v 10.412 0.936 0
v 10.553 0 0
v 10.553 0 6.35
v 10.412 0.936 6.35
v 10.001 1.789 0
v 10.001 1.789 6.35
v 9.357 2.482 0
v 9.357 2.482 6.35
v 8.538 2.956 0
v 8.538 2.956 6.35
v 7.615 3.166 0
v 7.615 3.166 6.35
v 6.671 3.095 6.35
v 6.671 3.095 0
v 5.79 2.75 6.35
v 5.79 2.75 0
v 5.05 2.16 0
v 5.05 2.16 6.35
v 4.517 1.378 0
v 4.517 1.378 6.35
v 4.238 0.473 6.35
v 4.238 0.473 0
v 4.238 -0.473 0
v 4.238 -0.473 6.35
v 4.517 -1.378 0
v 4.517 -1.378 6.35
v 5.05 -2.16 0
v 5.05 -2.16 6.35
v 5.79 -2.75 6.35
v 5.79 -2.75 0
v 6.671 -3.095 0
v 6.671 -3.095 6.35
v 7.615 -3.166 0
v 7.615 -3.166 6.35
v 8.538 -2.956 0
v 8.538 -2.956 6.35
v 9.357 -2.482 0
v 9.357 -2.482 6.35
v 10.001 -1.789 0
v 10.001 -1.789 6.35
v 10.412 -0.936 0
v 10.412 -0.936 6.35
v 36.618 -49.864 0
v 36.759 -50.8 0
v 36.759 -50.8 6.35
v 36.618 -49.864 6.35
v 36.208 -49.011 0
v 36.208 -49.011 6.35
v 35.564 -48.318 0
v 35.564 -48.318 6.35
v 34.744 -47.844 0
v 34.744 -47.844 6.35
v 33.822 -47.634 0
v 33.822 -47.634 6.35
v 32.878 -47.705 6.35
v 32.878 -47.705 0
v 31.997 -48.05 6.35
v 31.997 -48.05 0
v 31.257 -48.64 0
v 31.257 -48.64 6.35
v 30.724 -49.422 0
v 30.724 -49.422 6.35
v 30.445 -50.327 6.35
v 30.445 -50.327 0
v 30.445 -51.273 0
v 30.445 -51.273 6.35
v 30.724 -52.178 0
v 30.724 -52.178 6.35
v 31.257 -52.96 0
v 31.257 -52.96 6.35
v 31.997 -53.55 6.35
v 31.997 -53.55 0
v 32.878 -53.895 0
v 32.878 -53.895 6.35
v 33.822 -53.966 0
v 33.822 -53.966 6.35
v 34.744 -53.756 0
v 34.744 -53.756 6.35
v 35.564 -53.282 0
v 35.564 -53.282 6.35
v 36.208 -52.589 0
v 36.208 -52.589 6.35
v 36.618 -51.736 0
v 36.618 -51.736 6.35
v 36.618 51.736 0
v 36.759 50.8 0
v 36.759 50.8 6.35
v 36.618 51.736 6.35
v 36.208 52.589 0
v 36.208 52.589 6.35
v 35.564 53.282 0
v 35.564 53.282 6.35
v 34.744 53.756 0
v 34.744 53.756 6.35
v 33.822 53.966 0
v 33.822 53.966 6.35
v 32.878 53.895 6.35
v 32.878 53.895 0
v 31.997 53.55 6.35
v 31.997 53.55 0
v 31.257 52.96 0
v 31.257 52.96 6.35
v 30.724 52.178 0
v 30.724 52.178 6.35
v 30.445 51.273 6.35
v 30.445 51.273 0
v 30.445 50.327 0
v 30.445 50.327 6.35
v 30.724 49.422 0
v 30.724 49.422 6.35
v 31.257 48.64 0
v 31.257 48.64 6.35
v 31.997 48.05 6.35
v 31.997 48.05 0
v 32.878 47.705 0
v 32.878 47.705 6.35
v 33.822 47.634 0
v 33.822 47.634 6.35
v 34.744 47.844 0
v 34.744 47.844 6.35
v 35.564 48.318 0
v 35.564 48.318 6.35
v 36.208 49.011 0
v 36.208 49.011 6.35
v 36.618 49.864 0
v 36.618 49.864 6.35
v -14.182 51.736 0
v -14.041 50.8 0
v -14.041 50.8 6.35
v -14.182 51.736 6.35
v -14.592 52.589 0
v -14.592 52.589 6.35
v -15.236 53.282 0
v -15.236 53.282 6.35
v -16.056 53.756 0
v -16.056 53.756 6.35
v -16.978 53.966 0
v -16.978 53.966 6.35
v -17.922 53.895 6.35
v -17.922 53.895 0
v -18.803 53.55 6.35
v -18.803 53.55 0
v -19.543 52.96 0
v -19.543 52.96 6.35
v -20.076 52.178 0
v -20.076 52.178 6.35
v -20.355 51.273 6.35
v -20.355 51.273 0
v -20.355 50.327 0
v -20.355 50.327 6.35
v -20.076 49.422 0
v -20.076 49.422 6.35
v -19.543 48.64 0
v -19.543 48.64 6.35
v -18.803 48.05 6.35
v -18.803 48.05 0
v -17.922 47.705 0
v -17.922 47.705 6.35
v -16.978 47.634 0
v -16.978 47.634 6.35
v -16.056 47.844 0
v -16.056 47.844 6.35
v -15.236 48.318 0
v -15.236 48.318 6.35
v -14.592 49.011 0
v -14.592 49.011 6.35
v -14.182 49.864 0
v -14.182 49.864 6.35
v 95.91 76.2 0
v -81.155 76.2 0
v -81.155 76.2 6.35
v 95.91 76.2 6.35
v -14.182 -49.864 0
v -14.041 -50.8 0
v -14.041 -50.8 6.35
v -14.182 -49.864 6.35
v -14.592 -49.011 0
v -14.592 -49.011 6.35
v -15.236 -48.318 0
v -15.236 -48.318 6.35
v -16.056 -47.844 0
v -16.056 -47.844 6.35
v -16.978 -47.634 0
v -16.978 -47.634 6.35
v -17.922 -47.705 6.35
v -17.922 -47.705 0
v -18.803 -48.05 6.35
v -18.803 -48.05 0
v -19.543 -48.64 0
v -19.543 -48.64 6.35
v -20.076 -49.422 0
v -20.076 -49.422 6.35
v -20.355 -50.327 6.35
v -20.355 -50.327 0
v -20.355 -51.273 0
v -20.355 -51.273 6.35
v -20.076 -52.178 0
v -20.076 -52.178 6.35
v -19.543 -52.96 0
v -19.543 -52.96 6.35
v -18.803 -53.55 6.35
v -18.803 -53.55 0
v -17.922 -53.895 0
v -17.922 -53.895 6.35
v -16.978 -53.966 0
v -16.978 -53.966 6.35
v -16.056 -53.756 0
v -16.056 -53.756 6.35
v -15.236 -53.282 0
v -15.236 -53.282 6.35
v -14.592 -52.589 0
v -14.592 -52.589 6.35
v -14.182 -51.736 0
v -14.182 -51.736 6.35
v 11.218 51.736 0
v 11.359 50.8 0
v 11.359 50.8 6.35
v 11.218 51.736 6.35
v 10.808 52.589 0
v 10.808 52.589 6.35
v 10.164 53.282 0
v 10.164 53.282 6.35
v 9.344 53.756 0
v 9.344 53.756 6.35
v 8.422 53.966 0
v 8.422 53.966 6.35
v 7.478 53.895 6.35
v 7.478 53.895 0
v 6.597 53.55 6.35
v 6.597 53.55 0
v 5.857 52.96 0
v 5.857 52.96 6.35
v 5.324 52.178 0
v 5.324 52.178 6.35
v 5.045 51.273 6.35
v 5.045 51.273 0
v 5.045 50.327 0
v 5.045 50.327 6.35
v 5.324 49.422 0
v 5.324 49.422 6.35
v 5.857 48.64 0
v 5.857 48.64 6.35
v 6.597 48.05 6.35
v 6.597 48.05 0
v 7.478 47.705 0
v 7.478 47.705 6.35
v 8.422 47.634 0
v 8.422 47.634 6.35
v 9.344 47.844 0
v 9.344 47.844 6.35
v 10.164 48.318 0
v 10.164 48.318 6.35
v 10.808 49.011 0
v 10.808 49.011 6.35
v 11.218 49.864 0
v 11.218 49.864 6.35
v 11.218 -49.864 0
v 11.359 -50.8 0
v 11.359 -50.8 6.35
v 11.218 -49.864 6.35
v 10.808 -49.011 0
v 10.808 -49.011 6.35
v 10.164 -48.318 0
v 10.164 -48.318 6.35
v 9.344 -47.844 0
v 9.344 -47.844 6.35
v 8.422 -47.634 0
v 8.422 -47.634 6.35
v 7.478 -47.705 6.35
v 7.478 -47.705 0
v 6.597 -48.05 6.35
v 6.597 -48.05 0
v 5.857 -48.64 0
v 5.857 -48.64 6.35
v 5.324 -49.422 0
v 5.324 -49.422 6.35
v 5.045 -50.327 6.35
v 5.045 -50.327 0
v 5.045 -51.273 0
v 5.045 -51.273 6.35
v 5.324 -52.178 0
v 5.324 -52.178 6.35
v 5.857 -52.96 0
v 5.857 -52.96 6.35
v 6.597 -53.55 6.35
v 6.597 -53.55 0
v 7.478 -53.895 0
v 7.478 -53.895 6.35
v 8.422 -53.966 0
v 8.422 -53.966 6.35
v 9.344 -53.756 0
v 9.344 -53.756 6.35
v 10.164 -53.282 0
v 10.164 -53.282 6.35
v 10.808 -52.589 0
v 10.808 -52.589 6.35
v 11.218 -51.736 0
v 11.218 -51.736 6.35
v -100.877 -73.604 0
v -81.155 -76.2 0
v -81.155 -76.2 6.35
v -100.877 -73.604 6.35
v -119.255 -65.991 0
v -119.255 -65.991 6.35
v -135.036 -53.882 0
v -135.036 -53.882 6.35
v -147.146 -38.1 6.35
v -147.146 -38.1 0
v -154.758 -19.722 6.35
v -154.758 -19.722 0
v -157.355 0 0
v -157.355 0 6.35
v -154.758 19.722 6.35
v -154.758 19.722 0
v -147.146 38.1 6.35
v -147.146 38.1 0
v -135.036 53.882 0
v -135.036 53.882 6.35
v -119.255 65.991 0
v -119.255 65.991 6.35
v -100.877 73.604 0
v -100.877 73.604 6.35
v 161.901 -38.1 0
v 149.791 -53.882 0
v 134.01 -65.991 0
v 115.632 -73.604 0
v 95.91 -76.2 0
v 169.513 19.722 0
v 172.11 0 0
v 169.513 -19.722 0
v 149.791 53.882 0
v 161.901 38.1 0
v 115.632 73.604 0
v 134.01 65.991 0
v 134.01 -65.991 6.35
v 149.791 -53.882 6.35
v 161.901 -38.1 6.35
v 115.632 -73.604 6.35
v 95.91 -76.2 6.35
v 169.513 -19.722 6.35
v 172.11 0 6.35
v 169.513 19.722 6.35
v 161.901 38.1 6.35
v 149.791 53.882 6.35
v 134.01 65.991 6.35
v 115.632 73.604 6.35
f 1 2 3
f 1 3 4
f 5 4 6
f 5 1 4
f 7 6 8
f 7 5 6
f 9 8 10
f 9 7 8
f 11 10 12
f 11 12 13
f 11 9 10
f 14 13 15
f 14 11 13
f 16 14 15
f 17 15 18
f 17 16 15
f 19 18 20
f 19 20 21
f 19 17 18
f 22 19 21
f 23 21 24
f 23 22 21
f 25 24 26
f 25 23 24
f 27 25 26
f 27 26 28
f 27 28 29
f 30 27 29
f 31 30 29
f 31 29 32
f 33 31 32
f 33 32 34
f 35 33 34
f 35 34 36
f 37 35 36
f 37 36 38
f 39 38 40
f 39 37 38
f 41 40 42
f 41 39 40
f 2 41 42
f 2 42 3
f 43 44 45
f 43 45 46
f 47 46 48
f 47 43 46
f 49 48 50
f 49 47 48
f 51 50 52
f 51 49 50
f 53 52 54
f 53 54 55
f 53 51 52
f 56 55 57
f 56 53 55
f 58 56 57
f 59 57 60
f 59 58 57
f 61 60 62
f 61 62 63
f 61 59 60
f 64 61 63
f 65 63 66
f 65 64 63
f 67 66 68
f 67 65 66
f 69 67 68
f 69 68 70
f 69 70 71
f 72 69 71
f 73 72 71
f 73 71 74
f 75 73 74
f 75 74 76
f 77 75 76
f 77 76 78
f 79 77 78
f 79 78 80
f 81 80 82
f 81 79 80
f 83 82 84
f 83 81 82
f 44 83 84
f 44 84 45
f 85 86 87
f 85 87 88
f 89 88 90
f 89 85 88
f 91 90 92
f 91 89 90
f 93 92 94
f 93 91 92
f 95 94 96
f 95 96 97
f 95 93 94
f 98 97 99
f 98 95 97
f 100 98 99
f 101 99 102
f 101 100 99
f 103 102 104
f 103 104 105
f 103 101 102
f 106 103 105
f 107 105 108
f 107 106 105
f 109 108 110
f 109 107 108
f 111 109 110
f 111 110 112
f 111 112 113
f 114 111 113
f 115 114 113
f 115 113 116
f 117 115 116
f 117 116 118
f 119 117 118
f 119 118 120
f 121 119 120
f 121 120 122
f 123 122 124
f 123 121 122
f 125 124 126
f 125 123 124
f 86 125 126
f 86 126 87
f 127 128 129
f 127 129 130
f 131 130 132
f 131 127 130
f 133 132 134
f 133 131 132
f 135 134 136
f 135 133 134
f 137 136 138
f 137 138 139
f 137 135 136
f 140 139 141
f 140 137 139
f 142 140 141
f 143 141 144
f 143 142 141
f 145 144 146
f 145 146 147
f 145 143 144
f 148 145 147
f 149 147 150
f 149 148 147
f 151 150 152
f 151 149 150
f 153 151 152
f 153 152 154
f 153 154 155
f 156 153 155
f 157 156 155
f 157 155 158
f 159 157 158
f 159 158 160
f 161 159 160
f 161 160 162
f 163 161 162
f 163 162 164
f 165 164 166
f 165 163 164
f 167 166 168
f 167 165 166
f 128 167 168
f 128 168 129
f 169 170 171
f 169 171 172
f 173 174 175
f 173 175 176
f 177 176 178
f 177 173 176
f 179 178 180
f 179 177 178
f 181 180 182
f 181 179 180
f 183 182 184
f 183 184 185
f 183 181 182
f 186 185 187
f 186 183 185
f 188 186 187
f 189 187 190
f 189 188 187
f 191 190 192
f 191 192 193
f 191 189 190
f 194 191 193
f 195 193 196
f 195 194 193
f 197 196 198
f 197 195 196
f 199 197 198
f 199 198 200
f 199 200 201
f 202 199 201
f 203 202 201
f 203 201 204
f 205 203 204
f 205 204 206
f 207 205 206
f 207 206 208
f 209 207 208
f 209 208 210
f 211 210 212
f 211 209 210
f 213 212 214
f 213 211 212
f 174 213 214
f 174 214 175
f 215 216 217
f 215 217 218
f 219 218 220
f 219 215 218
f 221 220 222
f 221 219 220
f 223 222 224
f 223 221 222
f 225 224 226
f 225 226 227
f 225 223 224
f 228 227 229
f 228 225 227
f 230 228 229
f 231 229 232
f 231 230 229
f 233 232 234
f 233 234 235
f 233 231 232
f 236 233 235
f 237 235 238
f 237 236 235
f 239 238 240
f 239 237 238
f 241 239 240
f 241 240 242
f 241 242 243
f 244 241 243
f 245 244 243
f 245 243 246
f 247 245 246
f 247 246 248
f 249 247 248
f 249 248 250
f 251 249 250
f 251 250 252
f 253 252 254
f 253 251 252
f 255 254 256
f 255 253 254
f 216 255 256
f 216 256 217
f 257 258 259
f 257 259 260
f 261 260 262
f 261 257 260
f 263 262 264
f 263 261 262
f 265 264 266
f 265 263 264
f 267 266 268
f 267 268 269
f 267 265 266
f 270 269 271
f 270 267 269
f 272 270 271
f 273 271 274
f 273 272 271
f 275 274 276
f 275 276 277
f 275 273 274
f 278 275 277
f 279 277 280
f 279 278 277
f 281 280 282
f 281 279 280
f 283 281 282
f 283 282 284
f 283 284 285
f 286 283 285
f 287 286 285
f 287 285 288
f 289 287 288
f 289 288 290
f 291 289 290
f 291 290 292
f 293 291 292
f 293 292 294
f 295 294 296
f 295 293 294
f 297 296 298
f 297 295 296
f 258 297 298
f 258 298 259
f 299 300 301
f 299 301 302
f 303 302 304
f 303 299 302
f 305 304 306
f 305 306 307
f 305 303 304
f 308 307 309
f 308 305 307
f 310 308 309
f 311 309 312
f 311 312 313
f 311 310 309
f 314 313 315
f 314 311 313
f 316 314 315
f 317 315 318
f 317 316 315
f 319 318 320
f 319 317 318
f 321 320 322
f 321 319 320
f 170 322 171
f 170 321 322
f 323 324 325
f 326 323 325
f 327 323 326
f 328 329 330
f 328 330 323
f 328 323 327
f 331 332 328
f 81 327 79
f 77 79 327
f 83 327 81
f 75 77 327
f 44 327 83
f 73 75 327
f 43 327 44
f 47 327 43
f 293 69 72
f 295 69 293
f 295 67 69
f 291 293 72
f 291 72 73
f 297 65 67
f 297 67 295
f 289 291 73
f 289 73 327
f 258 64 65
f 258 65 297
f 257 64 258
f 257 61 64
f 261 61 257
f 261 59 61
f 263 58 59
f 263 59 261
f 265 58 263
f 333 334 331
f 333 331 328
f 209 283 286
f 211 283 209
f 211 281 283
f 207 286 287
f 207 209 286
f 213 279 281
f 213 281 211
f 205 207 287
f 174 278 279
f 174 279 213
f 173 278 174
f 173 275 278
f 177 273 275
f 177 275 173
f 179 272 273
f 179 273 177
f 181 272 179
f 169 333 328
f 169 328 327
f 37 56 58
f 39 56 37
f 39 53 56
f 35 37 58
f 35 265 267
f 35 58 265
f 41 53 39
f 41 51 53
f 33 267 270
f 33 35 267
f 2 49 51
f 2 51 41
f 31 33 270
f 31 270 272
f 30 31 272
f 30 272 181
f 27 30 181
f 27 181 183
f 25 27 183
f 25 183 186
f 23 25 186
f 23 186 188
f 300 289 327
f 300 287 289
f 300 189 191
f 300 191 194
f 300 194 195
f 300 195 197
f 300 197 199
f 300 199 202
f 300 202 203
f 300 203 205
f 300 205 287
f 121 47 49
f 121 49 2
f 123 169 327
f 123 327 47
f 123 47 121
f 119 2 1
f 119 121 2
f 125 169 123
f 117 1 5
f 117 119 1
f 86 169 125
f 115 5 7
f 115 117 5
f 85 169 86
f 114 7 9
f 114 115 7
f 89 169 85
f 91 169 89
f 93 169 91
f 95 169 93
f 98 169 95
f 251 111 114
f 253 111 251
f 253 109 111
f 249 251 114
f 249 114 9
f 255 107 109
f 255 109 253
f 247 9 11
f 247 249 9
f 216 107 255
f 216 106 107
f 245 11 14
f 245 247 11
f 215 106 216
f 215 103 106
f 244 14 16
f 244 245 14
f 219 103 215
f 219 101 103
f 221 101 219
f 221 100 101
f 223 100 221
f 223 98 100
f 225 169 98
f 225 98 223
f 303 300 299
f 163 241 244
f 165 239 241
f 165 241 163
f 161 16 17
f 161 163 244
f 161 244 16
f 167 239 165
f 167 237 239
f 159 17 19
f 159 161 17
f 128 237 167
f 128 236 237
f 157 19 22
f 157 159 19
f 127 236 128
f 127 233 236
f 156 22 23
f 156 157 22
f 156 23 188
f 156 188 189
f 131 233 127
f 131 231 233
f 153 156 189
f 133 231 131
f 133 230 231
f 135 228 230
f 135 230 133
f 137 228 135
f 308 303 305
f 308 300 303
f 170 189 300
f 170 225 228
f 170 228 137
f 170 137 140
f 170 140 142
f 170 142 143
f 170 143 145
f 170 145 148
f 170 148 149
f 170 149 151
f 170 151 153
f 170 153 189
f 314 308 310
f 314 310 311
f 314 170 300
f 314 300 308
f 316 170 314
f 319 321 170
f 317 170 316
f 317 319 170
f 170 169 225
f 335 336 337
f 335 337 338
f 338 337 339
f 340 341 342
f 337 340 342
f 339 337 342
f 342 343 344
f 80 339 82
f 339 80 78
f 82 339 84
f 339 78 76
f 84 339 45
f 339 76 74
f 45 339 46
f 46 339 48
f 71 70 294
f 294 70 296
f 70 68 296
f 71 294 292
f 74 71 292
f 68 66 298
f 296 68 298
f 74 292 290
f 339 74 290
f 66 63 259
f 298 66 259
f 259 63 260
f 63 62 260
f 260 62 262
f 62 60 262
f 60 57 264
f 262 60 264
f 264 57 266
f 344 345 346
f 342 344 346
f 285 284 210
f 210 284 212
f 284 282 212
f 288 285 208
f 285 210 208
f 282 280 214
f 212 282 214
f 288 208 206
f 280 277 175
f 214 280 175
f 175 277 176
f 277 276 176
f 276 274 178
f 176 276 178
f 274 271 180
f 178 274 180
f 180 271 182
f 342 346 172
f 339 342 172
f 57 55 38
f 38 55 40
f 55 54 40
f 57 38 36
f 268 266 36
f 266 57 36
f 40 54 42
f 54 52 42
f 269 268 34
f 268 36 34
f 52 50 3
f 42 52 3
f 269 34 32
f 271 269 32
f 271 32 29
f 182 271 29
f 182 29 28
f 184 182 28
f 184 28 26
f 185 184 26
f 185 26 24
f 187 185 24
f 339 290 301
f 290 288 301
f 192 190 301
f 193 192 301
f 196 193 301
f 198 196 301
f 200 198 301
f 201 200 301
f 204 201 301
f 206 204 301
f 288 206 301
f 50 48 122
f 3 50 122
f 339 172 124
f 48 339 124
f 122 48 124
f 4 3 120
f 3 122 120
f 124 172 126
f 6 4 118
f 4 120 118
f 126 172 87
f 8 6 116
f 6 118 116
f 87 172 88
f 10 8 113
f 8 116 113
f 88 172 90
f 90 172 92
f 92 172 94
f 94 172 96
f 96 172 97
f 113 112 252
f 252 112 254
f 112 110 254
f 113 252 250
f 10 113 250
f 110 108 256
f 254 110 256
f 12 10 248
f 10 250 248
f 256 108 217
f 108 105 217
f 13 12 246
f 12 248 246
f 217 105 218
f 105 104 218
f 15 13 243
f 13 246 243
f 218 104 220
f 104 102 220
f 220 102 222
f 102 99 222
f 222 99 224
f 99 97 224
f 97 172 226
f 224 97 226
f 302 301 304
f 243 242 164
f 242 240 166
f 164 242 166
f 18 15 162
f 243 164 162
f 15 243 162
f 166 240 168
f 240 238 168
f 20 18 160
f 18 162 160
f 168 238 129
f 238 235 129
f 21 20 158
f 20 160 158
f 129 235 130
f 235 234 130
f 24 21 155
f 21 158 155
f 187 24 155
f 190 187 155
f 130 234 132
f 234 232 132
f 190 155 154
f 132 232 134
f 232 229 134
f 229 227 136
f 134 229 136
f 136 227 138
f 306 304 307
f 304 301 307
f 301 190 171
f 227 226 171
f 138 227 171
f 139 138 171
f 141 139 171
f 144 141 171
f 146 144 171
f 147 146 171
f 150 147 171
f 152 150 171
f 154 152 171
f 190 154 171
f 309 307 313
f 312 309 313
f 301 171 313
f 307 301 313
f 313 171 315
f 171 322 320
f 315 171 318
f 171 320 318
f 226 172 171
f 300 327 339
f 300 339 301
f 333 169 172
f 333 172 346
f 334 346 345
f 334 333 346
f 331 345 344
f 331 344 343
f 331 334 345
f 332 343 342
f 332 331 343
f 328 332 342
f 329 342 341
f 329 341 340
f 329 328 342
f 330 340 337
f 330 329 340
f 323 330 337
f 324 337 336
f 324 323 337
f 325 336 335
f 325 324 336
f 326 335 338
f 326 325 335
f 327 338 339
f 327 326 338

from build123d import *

# Parameters (mm, degrees)
SKETCH1_R           = 3.175
BOSS_EXTRUDE1_DEPTH = 6.35


with BuildPart() as part:
    # Sketch1 → Boss-Extrude1 (new body)
    with BuildSketch(Plane.XY):
        with BuildLine():
            Line((-81.15451448, 76.2), (95.90988075, 76.2))
            ThreePointArc((95.90988075, 76.2), (172.10988075, 0), (95.90988075, -76.2))
            Line((95.90988075, -76.2), (-81.15451448, -76.2))
            ThreePointArc((-81.15451448, -76.2), (-157.35451448, 0), (-81.15451448, 76.2))
        make_face()
        with Locations((8.184238886, 50.8)):
            Circle(SKETCH1_R, mode=Mode.SUBTRACT)
        with Locations((8.184238886, -50.8)):
            Circle(SKETCH1_R, mode=Mode.SUBTRACT)
        with Locations((-17.215761114, 50.8)):
            Circle(SKETCH1_R, mode=Mode.SUBTRACT)
        with Locations((33.584238886, 50.8)):
            Circle(SKETCH1_R, mode=Mode.SUBTRACT)
        with Locations((33.584238886, -50.8)):
            Circle(SKETCH1_R, mode=Mode.SUBTRACT)
        with Locations((-17.215761114, -50.8)):
            Circle(SKETCH1_R, mode=Mode.SUBTRACT)
        with Locations((7.377683135, 0)):
            Circle(SKETCH1_R, mode=Mode.SUBTRACT)
    extrude(amount=BOSS_EXTRUDE1_DEPTH)


solid = part.part
